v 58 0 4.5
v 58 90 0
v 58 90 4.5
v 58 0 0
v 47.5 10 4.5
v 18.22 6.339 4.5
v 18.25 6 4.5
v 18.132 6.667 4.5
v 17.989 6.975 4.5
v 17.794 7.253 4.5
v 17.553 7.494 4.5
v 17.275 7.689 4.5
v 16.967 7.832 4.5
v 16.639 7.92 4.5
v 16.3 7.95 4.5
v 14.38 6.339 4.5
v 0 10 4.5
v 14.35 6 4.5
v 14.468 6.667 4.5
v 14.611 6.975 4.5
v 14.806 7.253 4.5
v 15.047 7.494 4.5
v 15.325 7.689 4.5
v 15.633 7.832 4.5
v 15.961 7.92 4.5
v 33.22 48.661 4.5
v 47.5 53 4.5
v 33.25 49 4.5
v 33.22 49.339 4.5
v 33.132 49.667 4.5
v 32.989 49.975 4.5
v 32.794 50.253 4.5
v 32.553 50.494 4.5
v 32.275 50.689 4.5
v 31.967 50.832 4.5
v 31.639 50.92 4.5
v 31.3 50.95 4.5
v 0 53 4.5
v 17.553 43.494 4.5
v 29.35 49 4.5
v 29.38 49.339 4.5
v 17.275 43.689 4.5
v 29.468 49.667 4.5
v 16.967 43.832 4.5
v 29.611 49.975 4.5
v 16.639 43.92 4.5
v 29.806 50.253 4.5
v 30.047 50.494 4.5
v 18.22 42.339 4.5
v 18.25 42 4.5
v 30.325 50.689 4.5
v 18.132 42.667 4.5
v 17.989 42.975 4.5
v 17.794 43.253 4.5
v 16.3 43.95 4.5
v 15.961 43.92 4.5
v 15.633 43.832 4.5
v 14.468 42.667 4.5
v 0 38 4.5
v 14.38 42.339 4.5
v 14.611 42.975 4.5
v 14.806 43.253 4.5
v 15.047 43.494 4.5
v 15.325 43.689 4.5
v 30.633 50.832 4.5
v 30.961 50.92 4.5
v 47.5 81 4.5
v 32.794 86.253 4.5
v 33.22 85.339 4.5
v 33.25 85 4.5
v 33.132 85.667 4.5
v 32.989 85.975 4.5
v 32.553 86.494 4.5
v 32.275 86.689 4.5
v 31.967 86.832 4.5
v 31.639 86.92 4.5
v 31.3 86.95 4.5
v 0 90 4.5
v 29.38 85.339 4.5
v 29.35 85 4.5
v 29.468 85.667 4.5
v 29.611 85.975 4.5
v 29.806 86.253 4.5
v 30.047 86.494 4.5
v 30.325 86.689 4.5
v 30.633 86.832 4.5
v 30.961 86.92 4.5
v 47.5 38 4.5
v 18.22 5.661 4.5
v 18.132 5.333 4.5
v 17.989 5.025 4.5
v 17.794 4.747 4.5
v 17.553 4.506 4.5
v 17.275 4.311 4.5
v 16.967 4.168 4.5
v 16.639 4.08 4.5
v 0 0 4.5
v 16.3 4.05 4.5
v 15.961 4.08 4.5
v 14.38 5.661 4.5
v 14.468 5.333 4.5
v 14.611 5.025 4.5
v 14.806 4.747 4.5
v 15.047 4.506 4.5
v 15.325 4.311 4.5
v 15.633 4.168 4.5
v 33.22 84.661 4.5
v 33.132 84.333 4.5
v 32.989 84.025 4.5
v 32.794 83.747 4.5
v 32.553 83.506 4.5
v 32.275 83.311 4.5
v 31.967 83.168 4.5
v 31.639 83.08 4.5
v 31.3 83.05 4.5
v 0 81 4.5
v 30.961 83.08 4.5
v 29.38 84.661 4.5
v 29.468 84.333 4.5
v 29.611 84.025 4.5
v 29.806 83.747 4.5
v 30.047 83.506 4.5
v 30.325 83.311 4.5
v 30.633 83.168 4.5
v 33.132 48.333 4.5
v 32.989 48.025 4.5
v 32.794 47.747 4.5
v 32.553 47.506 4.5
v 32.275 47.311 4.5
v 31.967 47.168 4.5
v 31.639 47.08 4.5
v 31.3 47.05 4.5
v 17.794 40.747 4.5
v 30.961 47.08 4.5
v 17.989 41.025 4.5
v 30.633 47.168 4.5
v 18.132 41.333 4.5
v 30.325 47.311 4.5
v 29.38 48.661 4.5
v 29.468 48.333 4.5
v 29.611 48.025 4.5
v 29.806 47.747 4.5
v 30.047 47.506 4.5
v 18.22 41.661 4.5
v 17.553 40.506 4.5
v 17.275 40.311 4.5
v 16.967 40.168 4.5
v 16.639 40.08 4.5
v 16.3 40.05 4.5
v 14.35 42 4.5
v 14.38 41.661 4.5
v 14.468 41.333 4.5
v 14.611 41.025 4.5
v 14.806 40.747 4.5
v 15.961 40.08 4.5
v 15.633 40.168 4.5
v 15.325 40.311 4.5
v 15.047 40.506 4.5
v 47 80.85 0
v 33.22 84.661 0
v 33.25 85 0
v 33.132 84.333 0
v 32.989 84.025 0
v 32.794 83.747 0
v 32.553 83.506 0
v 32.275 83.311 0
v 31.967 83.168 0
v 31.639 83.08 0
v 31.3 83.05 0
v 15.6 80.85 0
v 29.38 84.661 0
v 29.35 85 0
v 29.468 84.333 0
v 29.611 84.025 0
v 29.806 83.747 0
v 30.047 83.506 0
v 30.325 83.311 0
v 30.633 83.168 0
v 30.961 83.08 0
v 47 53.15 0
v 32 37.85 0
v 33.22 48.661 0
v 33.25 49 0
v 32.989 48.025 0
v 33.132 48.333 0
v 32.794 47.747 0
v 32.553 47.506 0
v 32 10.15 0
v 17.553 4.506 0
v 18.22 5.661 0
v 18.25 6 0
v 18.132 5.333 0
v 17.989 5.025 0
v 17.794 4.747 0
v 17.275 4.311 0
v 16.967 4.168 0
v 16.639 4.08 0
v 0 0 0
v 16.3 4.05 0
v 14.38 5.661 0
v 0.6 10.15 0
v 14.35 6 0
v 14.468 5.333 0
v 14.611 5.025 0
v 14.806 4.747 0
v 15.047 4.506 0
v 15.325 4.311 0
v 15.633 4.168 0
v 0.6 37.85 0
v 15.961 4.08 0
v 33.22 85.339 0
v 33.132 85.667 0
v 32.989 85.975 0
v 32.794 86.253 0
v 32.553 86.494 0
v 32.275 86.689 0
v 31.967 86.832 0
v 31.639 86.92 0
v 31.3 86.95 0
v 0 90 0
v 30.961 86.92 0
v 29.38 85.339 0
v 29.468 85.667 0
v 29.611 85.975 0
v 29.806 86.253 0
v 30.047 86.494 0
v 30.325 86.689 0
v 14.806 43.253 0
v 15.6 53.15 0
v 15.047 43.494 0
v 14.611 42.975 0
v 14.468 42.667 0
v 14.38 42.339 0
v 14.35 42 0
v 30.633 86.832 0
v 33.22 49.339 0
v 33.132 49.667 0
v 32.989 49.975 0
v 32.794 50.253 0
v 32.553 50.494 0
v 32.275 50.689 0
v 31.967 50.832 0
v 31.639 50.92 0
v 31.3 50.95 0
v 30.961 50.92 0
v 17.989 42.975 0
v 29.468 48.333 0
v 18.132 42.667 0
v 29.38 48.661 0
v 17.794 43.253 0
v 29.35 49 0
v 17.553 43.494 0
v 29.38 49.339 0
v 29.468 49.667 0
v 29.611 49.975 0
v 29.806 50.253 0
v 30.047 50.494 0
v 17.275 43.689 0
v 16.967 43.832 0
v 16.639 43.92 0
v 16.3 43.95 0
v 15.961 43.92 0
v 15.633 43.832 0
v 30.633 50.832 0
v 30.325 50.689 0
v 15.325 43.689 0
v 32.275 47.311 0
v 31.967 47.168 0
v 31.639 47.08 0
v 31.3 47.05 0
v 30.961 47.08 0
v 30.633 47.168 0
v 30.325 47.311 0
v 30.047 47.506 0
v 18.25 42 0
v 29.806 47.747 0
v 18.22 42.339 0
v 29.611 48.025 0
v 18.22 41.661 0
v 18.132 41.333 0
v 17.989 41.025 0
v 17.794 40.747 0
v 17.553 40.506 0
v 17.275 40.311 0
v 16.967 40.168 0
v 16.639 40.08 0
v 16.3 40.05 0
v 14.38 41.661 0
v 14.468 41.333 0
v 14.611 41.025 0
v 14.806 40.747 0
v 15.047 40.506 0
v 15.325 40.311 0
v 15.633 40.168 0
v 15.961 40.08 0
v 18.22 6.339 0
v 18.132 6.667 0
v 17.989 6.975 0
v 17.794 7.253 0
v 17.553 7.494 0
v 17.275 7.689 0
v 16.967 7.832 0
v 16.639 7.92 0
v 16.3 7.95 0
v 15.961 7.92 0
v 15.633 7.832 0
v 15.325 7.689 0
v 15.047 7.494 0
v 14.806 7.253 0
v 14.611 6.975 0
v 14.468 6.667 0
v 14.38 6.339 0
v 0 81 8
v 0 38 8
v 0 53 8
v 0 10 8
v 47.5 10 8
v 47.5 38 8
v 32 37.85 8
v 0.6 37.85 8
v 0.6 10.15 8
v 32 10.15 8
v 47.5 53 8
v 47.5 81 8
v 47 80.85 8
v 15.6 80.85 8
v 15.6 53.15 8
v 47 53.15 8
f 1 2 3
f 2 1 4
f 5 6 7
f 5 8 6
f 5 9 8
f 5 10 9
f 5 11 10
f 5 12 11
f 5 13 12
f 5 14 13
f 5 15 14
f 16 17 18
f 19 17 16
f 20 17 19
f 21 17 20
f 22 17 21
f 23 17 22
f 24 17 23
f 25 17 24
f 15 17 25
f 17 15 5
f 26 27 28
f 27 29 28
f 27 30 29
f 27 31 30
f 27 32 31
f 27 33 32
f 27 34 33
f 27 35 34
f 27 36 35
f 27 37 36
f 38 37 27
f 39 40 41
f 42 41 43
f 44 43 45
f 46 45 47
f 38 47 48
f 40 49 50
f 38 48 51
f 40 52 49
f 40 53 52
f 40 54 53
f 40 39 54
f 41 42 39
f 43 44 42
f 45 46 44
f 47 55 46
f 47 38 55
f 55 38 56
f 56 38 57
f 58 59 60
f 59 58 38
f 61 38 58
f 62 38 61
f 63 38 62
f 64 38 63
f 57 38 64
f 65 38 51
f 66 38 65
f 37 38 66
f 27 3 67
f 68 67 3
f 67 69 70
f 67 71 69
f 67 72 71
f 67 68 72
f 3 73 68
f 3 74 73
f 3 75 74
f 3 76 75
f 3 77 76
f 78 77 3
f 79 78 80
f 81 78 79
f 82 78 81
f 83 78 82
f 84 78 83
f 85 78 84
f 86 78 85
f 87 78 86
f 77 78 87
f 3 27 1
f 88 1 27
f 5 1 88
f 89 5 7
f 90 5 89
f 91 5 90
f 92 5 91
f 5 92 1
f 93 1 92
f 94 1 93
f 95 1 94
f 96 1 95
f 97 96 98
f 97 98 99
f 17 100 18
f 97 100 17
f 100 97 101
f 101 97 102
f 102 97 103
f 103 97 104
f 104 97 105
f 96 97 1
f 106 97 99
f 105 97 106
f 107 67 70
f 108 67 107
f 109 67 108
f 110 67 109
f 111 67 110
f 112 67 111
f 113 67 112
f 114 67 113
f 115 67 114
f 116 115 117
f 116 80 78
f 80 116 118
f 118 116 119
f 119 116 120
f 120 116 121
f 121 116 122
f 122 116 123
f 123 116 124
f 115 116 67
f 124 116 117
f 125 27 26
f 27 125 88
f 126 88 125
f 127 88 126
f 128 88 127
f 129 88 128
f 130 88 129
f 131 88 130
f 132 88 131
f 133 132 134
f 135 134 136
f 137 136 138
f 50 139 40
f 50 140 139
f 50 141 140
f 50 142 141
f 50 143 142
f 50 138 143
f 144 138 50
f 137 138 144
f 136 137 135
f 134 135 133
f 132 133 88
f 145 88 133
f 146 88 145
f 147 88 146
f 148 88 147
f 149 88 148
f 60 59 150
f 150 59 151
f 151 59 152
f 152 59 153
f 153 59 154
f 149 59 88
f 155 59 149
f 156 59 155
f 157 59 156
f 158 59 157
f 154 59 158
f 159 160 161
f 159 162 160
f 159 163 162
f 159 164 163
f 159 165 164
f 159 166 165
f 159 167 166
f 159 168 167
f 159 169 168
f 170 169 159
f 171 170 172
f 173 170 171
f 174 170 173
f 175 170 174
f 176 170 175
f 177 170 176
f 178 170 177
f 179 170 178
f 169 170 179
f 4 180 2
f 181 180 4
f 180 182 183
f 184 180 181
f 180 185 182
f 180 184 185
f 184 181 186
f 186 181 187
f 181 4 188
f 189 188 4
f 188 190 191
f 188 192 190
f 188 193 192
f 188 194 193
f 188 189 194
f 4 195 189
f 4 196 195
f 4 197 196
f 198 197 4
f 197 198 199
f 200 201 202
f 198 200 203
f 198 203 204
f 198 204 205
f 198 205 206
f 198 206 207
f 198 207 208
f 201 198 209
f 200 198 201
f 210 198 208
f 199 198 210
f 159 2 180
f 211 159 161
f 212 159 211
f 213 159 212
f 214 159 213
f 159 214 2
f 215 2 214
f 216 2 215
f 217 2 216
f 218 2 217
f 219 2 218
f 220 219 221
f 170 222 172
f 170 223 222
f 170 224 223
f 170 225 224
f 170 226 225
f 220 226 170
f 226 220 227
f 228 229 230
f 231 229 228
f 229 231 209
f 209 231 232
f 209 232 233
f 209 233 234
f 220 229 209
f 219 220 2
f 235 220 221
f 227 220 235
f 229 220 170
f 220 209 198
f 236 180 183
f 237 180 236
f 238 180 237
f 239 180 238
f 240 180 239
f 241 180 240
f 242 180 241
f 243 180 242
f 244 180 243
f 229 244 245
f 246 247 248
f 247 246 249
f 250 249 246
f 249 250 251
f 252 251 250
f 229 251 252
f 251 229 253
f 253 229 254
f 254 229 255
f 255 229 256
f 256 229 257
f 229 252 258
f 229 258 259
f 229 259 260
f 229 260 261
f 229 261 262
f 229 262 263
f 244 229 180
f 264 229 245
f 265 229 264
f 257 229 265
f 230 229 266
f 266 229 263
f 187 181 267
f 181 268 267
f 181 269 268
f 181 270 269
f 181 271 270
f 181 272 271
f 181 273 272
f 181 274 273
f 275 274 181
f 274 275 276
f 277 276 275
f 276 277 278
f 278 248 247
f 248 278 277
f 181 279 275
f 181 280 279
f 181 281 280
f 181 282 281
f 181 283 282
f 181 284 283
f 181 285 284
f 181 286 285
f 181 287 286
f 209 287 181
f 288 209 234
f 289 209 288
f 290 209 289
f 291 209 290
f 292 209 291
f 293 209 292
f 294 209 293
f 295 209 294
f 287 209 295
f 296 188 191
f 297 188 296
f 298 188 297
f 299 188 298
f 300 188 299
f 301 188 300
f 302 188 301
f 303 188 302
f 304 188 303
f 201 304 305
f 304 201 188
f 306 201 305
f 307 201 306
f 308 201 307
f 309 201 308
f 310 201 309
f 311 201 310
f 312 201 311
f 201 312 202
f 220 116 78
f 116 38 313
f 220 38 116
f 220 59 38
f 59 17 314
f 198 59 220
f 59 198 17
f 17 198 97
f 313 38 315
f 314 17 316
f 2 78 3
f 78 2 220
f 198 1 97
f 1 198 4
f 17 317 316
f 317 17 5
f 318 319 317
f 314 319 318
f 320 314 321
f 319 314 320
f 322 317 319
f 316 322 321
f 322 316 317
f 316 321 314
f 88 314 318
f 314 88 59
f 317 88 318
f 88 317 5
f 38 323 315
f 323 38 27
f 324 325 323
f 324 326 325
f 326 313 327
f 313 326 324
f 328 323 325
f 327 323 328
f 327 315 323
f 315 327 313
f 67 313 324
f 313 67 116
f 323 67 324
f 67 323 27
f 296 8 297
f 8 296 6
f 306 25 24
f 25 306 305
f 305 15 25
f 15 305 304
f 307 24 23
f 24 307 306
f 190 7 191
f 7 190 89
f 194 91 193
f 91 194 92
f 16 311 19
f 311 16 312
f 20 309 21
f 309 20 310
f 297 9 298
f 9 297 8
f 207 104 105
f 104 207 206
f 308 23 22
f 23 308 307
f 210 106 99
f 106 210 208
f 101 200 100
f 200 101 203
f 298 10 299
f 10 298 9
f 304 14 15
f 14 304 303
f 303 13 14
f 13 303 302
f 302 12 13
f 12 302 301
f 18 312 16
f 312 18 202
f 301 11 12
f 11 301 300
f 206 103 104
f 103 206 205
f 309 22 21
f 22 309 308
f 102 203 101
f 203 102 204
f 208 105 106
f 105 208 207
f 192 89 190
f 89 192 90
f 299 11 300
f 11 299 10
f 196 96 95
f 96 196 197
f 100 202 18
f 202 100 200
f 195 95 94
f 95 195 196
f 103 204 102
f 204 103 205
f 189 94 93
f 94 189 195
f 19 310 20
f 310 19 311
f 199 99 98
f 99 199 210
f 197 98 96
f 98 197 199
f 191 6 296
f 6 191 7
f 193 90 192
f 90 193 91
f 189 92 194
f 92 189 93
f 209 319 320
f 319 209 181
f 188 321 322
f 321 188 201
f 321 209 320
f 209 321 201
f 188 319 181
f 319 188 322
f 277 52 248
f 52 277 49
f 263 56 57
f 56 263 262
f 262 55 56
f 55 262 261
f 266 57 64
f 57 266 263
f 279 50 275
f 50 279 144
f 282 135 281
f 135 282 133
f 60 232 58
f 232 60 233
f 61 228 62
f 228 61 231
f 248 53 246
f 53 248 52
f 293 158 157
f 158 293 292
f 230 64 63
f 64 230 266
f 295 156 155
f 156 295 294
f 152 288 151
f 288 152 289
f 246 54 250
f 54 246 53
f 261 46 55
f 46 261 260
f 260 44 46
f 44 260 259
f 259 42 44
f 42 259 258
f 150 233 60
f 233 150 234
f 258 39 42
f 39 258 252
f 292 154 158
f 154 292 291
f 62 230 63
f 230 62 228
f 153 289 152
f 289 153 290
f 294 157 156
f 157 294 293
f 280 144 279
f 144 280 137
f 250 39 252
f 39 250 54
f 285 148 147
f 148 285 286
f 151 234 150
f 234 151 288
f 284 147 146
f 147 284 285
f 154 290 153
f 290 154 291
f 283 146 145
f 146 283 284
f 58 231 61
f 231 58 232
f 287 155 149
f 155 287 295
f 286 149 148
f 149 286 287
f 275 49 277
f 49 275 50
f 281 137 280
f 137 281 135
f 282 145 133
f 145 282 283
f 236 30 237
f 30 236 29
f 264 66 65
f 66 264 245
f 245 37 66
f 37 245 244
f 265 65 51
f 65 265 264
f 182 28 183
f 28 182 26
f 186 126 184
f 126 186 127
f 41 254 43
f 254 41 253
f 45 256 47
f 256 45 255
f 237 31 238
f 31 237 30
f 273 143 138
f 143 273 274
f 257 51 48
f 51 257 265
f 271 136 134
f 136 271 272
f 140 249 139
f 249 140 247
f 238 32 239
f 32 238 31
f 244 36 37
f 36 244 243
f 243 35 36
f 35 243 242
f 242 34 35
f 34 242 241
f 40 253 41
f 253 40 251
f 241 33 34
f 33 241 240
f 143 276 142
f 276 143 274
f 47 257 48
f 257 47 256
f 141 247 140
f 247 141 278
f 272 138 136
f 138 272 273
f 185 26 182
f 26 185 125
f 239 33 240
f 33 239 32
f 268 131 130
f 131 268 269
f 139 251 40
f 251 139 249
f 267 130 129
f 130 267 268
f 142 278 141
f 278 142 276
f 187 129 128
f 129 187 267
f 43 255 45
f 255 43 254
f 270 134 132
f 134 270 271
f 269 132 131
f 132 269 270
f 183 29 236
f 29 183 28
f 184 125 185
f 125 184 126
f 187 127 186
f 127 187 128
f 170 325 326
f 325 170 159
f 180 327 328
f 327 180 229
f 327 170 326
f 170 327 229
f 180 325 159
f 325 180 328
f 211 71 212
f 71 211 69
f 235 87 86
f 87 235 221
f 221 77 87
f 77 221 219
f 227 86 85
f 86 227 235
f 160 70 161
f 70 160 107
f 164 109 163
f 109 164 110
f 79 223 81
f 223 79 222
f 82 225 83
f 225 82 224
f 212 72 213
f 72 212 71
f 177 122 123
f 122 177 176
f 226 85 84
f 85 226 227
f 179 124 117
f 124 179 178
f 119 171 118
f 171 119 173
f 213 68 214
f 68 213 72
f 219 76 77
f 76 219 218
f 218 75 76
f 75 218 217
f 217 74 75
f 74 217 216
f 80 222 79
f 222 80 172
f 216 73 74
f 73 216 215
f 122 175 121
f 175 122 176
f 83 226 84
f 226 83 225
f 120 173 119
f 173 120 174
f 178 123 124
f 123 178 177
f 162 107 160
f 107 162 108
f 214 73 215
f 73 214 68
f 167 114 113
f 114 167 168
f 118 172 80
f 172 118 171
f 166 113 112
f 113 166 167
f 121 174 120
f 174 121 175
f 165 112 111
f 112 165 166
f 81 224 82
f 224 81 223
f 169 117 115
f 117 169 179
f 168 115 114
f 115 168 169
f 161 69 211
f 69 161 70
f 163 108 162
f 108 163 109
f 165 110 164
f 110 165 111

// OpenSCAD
// file: lib.scad
module iec_socket(thickness = 4.5, width = 50) {
    rect_width = 31.5;
    edge_width = (width - rect_width) / 2;   
    height = 22.5;

    cutout_base_width = 27;
    cutout_top_width = 16;
    cutout_top_width_offset = (cutout_base_width - cutout_top_width) / 2; 

    cutout_base_height = 14;
    cutout_height = 19;

    screw_hole_center_from_rectangle = 5;

    translate([edge_width, 0, 0]) {
        difference() {
            union(){
                cube([rect_width, thickness, height]);

                translate([0, thickness, 0]) {
                    rotate([90, 0, 0]) linear_extrude(thickness) polygon([
                        [0, 0],
                        [-edge_width, height / 2],
                        [0, height]
                    ]);

                    rotate([90, 0, 0]) linear_extrude(thickness) polygon([
                        [rect_width, height],
                        [rect_width + edge_width, height / 2],
                        [rect_width, 0]
                    ]);

                }    
            }
            translate([-screw_hole_center_from_rectangle, 2, height / 2]) rotate([90, 0, 0]) cylinder(h=thickness + 2, r=1.5, center=true);
            
            translate([rect_width + screw_hole_center_from_rectangle, 2, height / 2]) rotate([90, 0, 0]) cylinder(h=thickness + 2, r=1.5, center=true);
            
            translate([(rect_width - cutout_base_width) / 2, thickness + 1, (height - cutout_height) / 2]) rotate([90, 0, 0]) linear_extrude(thickness + 2) polygon([
                [0, 0],
                [cutout_base_width, 0],
                [cutout_base_width, cutout_base_height],
                [cutout_base_width - cutout_top_width_offset, cutout_height],
                [cutout_top_width_offset, cutout_height],
                [0, cutout_base_height],
            ]);
        }
    }
}
// file: vars.scad
$fn = 36;
thickness = 4.5;

CLEARANCE_LOOSE_FIT = 0.4; // hinges, working parts etc
CLEARANCE_TIGHT_FIT = 0.2; // plugs etc
// main file
include <vars.scad>;
use <lib.scad>;

base_width = 58;
base_length = 90;

module base() {
    cube([base_width, base_length, thickness]);
}

module switched_inlet_cutout() {
    // this is given on the spec sheet
    cube([28, 47.5, thickness - 1]);
}

module iec320_c14_outlet_719W_00_03() {
    // cut outs from spec sheet
    hole_centers = 36;
    screw_diameters = 3.5 + CLEARANCE_LOOSE_FIT;
    screw_radius = screw_diameters / 2;
    height = 31.4;
    
    compartment_width = 27.3 + CLEARANCE_LOOSE_FIT;
        
    translate([0, height / 2, 0]) cylinder(r1=screw_radius, r2=screw_radius, h=thickness*2);
    translate([
        (hole_centers - compartment_width) / 2,
        0,
        0
    ]) cube([compartment_width, 31.4, thickness * 2]);
    translate([hole_centers, height / 2, 0]) cylinder(r1=screw_radius, r2=screw_radius, h=thickness*2);
    
}


inlet_x = 0;

difference() {
    
    union() {
        base();

        translate([inlet_x, 28 + 10, thickness]) rotate([0, 0, 270]) switched_inlet_cutout();

        translate([inlet_x, (28 + 10) * 2 + 5, thickness]) rotate([0, 0, 270]) switched_inlet_cutout();
    }
    
    translate([base_width - 26, 6, 0]) rotate([0, 0, 90]) iec320_c14_outlet_719W_00_03();

    translate([base_width - 11, 49, 0]) rotate([0, 0, 90]) iec320_c14_outlet_719W_00_03();
}
